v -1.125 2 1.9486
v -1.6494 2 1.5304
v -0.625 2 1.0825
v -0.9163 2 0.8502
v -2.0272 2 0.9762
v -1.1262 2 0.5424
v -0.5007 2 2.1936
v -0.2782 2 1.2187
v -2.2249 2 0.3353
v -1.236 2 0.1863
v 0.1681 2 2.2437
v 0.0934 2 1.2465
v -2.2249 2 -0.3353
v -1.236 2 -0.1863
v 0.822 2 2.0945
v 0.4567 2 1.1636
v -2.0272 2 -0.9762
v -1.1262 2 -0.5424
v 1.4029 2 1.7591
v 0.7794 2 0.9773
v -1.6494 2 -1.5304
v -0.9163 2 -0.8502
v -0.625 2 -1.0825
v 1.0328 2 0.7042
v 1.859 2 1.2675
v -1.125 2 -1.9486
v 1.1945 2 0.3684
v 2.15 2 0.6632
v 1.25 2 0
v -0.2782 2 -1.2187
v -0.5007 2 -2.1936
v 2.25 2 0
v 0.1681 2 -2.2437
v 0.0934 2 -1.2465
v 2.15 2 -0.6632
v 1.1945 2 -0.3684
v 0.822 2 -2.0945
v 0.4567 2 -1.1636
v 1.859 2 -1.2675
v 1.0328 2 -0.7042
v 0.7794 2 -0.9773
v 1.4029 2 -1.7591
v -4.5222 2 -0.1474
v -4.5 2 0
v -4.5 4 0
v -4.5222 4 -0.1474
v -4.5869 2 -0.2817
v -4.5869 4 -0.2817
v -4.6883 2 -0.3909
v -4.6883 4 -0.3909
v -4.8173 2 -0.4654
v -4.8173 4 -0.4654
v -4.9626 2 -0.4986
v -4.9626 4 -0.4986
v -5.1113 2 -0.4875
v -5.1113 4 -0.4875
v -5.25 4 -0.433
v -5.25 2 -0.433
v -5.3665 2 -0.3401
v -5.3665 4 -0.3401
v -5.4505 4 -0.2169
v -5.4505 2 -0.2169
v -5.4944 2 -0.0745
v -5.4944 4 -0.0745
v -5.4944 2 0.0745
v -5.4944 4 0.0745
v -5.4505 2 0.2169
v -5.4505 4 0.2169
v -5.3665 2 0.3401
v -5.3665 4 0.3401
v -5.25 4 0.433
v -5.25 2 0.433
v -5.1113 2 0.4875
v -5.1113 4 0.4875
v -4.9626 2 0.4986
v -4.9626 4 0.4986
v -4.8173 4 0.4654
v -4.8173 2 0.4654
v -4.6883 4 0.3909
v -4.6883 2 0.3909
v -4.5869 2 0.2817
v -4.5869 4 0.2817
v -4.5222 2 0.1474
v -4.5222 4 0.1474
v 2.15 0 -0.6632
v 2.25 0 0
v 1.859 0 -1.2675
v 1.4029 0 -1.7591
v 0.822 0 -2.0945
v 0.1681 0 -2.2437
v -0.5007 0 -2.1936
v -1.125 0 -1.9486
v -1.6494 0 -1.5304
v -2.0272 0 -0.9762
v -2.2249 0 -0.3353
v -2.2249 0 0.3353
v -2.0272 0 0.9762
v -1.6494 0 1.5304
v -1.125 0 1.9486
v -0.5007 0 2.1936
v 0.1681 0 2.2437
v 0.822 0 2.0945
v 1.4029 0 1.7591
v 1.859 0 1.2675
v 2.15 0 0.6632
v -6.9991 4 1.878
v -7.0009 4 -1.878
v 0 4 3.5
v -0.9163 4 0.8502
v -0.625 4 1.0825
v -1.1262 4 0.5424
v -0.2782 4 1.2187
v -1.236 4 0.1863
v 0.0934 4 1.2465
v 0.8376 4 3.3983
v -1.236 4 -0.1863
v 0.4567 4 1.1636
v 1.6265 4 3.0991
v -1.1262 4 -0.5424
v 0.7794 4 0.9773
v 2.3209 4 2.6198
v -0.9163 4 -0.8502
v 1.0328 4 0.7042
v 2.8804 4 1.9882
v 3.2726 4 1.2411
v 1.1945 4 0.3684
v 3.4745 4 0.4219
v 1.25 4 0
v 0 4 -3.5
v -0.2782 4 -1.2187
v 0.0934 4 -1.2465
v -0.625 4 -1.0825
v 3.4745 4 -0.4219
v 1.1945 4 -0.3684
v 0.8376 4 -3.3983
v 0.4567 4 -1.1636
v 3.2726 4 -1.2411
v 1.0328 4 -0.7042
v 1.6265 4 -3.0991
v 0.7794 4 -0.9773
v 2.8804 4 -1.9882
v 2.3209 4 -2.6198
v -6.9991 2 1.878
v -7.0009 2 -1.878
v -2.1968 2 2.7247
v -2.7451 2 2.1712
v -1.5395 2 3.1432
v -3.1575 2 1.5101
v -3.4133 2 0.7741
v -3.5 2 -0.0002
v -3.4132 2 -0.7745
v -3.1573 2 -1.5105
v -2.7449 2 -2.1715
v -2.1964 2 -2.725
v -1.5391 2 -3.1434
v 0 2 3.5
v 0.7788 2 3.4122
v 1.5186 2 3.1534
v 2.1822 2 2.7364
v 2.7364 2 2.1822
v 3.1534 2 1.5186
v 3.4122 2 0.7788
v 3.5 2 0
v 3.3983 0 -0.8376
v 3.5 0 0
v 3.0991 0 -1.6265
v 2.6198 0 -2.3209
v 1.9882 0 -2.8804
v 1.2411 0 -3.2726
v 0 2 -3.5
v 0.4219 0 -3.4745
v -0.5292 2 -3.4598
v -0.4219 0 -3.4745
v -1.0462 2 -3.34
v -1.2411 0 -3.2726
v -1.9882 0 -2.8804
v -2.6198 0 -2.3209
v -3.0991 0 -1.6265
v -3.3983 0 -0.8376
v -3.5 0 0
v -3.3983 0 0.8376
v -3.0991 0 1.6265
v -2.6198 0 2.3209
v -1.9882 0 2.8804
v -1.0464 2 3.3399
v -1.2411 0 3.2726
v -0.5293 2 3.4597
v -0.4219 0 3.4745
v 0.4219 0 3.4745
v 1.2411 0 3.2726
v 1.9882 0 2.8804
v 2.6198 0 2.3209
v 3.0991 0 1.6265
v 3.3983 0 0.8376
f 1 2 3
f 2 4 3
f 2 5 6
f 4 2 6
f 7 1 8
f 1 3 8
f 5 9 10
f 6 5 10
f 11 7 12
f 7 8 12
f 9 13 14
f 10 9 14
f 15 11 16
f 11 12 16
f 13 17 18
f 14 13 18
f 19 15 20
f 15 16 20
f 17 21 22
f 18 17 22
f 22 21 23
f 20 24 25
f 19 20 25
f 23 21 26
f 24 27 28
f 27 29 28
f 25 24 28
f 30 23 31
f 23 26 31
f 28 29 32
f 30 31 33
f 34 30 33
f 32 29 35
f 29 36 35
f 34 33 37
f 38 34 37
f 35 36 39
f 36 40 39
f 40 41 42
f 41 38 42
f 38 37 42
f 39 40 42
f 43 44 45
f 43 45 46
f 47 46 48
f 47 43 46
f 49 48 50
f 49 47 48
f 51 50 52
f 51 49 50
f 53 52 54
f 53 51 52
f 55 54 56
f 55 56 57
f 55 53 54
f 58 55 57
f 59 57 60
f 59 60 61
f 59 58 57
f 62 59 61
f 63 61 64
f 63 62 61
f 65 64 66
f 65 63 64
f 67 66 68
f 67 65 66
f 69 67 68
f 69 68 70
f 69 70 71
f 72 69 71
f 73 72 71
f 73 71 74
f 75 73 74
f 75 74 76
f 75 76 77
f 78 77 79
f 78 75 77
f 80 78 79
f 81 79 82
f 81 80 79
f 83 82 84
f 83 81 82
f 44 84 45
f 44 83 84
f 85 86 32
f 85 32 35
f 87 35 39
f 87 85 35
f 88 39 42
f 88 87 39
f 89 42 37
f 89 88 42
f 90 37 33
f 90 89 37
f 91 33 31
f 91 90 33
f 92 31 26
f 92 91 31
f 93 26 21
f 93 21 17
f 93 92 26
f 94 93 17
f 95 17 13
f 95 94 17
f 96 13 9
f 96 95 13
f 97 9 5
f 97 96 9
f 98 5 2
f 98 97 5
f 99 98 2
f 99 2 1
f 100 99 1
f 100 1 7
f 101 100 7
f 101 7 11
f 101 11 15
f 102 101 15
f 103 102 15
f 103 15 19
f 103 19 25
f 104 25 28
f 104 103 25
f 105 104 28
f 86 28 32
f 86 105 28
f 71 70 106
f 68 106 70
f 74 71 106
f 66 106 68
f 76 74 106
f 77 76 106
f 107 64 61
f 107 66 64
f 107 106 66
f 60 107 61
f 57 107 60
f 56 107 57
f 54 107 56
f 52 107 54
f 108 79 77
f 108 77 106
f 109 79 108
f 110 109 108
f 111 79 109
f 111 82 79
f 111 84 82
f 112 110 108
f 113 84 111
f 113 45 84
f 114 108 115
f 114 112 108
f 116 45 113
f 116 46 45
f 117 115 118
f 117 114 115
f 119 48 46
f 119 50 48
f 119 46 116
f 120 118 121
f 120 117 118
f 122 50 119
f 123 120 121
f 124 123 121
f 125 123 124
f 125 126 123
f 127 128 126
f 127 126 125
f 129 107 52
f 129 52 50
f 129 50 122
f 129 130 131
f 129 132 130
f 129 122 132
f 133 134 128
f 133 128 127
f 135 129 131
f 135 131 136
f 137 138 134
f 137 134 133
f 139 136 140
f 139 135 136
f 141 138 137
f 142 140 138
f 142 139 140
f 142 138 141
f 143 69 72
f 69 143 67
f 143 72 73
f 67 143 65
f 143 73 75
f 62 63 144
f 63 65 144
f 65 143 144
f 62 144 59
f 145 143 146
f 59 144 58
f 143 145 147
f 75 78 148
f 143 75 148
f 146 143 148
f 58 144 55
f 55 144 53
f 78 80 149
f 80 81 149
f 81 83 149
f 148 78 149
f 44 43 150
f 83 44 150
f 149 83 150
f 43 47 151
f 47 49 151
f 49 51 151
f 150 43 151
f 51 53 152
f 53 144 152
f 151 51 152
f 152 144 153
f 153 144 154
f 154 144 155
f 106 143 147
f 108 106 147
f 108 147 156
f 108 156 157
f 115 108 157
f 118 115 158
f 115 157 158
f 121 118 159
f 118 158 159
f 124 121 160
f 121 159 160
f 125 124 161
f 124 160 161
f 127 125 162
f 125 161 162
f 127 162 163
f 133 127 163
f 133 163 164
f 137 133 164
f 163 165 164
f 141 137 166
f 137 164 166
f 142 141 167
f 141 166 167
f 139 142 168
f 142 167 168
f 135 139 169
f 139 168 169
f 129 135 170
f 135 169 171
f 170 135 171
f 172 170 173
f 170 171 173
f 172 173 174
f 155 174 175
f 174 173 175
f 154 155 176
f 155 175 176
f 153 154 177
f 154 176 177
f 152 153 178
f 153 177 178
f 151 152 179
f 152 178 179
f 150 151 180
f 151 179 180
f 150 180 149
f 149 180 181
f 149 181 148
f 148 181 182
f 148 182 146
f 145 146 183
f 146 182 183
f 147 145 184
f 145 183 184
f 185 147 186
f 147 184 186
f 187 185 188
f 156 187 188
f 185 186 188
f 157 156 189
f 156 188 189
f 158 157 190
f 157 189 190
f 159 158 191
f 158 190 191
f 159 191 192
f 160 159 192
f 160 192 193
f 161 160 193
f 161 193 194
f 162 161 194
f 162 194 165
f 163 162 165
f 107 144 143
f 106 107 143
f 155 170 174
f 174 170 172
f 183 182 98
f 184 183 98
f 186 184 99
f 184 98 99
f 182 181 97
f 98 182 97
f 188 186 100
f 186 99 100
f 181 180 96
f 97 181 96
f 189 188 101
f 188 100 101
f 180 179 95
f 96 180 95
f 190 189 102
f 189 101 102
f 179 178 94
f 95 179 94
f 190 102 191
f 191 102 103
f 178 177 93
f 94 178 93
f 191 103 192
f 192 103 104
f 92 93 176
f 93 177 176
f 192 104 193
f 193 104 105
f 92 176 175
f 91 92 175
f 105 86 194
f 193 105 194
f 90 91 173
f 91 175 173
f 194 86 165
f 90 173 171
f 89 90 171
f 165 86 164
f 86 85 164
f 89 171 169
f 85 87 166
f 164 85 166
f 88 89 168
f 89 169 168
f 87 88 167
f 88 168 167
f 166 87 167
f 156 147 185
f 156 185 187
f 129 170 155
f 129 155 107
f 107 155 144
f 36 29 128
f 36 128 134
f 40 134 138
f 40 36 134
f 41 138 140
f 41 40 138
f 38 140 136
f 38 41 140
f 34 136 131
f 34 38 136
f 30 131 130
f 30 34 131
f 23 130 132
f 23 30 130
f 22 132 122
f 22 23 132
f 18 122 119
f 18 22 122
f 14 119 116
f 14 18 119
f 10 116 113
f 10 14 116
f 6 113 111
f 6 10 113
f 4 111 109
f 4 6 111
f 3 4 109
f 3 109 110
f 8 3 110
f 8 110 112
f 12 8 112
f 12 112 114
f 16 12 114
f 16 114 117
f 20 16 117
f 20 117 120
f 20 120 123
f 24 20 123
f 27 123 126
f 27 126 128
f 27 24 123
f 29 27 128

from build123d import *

# Parameters (mm, degrees)
SKETCH1_R           = 3.5
SKETCH1_R_2         = 2.25
BOSS_EXTRUDE1_DEPTH = 2
SKETCH2_R           = 1.25
SKETCH2_R_2         = 0.5
BOSS_EXTRUDE3_DEPTH = 2


with BuildPart() as part:
    # Sketch1 → Boss-Extrude1 (new body)
    with BuildSketch(Plane(origin=(0, 0, 0), x_dir=(1, 0, 0), z_dir=(0, 1, 0))):
        Circle(SKETCH1_R)
        Circle(SKETCH1_R_2, mode=Mode.SUBTRACT)
    extrude(amount=BOSS_EXTRUDE1_DEPTH)

    # Sketch2 → Boss-Extrude3 (add)
    with BuildSketch(Plane(origin=(0, 2, 0), x_dir=(1, 0, 0), z_dir=(0, 1, 0))):
        with BuildLine():
            Line((-7.000925654, 1.878025645), (-6.999074346, -1.878025645))
            Line((-6.999074346, -1.878025645), (0, -3.5))
            ThreePointArc((0, -3.5), (3.5, 0), (0, 3.5))
            Line((0, 3.5), (-7.000925654, 1.878025645))
        make_face()
        Circle(SKETCH2_R, mode=Mode.SUBTRACT)
        with Locations((-5, 0)):
            Circle(SKETCH2_R_2, mode=Mode.SUBTRACT)
    extrude(amount=BOSS_EXTRUDE3_DEPTH)


solid = part.part
